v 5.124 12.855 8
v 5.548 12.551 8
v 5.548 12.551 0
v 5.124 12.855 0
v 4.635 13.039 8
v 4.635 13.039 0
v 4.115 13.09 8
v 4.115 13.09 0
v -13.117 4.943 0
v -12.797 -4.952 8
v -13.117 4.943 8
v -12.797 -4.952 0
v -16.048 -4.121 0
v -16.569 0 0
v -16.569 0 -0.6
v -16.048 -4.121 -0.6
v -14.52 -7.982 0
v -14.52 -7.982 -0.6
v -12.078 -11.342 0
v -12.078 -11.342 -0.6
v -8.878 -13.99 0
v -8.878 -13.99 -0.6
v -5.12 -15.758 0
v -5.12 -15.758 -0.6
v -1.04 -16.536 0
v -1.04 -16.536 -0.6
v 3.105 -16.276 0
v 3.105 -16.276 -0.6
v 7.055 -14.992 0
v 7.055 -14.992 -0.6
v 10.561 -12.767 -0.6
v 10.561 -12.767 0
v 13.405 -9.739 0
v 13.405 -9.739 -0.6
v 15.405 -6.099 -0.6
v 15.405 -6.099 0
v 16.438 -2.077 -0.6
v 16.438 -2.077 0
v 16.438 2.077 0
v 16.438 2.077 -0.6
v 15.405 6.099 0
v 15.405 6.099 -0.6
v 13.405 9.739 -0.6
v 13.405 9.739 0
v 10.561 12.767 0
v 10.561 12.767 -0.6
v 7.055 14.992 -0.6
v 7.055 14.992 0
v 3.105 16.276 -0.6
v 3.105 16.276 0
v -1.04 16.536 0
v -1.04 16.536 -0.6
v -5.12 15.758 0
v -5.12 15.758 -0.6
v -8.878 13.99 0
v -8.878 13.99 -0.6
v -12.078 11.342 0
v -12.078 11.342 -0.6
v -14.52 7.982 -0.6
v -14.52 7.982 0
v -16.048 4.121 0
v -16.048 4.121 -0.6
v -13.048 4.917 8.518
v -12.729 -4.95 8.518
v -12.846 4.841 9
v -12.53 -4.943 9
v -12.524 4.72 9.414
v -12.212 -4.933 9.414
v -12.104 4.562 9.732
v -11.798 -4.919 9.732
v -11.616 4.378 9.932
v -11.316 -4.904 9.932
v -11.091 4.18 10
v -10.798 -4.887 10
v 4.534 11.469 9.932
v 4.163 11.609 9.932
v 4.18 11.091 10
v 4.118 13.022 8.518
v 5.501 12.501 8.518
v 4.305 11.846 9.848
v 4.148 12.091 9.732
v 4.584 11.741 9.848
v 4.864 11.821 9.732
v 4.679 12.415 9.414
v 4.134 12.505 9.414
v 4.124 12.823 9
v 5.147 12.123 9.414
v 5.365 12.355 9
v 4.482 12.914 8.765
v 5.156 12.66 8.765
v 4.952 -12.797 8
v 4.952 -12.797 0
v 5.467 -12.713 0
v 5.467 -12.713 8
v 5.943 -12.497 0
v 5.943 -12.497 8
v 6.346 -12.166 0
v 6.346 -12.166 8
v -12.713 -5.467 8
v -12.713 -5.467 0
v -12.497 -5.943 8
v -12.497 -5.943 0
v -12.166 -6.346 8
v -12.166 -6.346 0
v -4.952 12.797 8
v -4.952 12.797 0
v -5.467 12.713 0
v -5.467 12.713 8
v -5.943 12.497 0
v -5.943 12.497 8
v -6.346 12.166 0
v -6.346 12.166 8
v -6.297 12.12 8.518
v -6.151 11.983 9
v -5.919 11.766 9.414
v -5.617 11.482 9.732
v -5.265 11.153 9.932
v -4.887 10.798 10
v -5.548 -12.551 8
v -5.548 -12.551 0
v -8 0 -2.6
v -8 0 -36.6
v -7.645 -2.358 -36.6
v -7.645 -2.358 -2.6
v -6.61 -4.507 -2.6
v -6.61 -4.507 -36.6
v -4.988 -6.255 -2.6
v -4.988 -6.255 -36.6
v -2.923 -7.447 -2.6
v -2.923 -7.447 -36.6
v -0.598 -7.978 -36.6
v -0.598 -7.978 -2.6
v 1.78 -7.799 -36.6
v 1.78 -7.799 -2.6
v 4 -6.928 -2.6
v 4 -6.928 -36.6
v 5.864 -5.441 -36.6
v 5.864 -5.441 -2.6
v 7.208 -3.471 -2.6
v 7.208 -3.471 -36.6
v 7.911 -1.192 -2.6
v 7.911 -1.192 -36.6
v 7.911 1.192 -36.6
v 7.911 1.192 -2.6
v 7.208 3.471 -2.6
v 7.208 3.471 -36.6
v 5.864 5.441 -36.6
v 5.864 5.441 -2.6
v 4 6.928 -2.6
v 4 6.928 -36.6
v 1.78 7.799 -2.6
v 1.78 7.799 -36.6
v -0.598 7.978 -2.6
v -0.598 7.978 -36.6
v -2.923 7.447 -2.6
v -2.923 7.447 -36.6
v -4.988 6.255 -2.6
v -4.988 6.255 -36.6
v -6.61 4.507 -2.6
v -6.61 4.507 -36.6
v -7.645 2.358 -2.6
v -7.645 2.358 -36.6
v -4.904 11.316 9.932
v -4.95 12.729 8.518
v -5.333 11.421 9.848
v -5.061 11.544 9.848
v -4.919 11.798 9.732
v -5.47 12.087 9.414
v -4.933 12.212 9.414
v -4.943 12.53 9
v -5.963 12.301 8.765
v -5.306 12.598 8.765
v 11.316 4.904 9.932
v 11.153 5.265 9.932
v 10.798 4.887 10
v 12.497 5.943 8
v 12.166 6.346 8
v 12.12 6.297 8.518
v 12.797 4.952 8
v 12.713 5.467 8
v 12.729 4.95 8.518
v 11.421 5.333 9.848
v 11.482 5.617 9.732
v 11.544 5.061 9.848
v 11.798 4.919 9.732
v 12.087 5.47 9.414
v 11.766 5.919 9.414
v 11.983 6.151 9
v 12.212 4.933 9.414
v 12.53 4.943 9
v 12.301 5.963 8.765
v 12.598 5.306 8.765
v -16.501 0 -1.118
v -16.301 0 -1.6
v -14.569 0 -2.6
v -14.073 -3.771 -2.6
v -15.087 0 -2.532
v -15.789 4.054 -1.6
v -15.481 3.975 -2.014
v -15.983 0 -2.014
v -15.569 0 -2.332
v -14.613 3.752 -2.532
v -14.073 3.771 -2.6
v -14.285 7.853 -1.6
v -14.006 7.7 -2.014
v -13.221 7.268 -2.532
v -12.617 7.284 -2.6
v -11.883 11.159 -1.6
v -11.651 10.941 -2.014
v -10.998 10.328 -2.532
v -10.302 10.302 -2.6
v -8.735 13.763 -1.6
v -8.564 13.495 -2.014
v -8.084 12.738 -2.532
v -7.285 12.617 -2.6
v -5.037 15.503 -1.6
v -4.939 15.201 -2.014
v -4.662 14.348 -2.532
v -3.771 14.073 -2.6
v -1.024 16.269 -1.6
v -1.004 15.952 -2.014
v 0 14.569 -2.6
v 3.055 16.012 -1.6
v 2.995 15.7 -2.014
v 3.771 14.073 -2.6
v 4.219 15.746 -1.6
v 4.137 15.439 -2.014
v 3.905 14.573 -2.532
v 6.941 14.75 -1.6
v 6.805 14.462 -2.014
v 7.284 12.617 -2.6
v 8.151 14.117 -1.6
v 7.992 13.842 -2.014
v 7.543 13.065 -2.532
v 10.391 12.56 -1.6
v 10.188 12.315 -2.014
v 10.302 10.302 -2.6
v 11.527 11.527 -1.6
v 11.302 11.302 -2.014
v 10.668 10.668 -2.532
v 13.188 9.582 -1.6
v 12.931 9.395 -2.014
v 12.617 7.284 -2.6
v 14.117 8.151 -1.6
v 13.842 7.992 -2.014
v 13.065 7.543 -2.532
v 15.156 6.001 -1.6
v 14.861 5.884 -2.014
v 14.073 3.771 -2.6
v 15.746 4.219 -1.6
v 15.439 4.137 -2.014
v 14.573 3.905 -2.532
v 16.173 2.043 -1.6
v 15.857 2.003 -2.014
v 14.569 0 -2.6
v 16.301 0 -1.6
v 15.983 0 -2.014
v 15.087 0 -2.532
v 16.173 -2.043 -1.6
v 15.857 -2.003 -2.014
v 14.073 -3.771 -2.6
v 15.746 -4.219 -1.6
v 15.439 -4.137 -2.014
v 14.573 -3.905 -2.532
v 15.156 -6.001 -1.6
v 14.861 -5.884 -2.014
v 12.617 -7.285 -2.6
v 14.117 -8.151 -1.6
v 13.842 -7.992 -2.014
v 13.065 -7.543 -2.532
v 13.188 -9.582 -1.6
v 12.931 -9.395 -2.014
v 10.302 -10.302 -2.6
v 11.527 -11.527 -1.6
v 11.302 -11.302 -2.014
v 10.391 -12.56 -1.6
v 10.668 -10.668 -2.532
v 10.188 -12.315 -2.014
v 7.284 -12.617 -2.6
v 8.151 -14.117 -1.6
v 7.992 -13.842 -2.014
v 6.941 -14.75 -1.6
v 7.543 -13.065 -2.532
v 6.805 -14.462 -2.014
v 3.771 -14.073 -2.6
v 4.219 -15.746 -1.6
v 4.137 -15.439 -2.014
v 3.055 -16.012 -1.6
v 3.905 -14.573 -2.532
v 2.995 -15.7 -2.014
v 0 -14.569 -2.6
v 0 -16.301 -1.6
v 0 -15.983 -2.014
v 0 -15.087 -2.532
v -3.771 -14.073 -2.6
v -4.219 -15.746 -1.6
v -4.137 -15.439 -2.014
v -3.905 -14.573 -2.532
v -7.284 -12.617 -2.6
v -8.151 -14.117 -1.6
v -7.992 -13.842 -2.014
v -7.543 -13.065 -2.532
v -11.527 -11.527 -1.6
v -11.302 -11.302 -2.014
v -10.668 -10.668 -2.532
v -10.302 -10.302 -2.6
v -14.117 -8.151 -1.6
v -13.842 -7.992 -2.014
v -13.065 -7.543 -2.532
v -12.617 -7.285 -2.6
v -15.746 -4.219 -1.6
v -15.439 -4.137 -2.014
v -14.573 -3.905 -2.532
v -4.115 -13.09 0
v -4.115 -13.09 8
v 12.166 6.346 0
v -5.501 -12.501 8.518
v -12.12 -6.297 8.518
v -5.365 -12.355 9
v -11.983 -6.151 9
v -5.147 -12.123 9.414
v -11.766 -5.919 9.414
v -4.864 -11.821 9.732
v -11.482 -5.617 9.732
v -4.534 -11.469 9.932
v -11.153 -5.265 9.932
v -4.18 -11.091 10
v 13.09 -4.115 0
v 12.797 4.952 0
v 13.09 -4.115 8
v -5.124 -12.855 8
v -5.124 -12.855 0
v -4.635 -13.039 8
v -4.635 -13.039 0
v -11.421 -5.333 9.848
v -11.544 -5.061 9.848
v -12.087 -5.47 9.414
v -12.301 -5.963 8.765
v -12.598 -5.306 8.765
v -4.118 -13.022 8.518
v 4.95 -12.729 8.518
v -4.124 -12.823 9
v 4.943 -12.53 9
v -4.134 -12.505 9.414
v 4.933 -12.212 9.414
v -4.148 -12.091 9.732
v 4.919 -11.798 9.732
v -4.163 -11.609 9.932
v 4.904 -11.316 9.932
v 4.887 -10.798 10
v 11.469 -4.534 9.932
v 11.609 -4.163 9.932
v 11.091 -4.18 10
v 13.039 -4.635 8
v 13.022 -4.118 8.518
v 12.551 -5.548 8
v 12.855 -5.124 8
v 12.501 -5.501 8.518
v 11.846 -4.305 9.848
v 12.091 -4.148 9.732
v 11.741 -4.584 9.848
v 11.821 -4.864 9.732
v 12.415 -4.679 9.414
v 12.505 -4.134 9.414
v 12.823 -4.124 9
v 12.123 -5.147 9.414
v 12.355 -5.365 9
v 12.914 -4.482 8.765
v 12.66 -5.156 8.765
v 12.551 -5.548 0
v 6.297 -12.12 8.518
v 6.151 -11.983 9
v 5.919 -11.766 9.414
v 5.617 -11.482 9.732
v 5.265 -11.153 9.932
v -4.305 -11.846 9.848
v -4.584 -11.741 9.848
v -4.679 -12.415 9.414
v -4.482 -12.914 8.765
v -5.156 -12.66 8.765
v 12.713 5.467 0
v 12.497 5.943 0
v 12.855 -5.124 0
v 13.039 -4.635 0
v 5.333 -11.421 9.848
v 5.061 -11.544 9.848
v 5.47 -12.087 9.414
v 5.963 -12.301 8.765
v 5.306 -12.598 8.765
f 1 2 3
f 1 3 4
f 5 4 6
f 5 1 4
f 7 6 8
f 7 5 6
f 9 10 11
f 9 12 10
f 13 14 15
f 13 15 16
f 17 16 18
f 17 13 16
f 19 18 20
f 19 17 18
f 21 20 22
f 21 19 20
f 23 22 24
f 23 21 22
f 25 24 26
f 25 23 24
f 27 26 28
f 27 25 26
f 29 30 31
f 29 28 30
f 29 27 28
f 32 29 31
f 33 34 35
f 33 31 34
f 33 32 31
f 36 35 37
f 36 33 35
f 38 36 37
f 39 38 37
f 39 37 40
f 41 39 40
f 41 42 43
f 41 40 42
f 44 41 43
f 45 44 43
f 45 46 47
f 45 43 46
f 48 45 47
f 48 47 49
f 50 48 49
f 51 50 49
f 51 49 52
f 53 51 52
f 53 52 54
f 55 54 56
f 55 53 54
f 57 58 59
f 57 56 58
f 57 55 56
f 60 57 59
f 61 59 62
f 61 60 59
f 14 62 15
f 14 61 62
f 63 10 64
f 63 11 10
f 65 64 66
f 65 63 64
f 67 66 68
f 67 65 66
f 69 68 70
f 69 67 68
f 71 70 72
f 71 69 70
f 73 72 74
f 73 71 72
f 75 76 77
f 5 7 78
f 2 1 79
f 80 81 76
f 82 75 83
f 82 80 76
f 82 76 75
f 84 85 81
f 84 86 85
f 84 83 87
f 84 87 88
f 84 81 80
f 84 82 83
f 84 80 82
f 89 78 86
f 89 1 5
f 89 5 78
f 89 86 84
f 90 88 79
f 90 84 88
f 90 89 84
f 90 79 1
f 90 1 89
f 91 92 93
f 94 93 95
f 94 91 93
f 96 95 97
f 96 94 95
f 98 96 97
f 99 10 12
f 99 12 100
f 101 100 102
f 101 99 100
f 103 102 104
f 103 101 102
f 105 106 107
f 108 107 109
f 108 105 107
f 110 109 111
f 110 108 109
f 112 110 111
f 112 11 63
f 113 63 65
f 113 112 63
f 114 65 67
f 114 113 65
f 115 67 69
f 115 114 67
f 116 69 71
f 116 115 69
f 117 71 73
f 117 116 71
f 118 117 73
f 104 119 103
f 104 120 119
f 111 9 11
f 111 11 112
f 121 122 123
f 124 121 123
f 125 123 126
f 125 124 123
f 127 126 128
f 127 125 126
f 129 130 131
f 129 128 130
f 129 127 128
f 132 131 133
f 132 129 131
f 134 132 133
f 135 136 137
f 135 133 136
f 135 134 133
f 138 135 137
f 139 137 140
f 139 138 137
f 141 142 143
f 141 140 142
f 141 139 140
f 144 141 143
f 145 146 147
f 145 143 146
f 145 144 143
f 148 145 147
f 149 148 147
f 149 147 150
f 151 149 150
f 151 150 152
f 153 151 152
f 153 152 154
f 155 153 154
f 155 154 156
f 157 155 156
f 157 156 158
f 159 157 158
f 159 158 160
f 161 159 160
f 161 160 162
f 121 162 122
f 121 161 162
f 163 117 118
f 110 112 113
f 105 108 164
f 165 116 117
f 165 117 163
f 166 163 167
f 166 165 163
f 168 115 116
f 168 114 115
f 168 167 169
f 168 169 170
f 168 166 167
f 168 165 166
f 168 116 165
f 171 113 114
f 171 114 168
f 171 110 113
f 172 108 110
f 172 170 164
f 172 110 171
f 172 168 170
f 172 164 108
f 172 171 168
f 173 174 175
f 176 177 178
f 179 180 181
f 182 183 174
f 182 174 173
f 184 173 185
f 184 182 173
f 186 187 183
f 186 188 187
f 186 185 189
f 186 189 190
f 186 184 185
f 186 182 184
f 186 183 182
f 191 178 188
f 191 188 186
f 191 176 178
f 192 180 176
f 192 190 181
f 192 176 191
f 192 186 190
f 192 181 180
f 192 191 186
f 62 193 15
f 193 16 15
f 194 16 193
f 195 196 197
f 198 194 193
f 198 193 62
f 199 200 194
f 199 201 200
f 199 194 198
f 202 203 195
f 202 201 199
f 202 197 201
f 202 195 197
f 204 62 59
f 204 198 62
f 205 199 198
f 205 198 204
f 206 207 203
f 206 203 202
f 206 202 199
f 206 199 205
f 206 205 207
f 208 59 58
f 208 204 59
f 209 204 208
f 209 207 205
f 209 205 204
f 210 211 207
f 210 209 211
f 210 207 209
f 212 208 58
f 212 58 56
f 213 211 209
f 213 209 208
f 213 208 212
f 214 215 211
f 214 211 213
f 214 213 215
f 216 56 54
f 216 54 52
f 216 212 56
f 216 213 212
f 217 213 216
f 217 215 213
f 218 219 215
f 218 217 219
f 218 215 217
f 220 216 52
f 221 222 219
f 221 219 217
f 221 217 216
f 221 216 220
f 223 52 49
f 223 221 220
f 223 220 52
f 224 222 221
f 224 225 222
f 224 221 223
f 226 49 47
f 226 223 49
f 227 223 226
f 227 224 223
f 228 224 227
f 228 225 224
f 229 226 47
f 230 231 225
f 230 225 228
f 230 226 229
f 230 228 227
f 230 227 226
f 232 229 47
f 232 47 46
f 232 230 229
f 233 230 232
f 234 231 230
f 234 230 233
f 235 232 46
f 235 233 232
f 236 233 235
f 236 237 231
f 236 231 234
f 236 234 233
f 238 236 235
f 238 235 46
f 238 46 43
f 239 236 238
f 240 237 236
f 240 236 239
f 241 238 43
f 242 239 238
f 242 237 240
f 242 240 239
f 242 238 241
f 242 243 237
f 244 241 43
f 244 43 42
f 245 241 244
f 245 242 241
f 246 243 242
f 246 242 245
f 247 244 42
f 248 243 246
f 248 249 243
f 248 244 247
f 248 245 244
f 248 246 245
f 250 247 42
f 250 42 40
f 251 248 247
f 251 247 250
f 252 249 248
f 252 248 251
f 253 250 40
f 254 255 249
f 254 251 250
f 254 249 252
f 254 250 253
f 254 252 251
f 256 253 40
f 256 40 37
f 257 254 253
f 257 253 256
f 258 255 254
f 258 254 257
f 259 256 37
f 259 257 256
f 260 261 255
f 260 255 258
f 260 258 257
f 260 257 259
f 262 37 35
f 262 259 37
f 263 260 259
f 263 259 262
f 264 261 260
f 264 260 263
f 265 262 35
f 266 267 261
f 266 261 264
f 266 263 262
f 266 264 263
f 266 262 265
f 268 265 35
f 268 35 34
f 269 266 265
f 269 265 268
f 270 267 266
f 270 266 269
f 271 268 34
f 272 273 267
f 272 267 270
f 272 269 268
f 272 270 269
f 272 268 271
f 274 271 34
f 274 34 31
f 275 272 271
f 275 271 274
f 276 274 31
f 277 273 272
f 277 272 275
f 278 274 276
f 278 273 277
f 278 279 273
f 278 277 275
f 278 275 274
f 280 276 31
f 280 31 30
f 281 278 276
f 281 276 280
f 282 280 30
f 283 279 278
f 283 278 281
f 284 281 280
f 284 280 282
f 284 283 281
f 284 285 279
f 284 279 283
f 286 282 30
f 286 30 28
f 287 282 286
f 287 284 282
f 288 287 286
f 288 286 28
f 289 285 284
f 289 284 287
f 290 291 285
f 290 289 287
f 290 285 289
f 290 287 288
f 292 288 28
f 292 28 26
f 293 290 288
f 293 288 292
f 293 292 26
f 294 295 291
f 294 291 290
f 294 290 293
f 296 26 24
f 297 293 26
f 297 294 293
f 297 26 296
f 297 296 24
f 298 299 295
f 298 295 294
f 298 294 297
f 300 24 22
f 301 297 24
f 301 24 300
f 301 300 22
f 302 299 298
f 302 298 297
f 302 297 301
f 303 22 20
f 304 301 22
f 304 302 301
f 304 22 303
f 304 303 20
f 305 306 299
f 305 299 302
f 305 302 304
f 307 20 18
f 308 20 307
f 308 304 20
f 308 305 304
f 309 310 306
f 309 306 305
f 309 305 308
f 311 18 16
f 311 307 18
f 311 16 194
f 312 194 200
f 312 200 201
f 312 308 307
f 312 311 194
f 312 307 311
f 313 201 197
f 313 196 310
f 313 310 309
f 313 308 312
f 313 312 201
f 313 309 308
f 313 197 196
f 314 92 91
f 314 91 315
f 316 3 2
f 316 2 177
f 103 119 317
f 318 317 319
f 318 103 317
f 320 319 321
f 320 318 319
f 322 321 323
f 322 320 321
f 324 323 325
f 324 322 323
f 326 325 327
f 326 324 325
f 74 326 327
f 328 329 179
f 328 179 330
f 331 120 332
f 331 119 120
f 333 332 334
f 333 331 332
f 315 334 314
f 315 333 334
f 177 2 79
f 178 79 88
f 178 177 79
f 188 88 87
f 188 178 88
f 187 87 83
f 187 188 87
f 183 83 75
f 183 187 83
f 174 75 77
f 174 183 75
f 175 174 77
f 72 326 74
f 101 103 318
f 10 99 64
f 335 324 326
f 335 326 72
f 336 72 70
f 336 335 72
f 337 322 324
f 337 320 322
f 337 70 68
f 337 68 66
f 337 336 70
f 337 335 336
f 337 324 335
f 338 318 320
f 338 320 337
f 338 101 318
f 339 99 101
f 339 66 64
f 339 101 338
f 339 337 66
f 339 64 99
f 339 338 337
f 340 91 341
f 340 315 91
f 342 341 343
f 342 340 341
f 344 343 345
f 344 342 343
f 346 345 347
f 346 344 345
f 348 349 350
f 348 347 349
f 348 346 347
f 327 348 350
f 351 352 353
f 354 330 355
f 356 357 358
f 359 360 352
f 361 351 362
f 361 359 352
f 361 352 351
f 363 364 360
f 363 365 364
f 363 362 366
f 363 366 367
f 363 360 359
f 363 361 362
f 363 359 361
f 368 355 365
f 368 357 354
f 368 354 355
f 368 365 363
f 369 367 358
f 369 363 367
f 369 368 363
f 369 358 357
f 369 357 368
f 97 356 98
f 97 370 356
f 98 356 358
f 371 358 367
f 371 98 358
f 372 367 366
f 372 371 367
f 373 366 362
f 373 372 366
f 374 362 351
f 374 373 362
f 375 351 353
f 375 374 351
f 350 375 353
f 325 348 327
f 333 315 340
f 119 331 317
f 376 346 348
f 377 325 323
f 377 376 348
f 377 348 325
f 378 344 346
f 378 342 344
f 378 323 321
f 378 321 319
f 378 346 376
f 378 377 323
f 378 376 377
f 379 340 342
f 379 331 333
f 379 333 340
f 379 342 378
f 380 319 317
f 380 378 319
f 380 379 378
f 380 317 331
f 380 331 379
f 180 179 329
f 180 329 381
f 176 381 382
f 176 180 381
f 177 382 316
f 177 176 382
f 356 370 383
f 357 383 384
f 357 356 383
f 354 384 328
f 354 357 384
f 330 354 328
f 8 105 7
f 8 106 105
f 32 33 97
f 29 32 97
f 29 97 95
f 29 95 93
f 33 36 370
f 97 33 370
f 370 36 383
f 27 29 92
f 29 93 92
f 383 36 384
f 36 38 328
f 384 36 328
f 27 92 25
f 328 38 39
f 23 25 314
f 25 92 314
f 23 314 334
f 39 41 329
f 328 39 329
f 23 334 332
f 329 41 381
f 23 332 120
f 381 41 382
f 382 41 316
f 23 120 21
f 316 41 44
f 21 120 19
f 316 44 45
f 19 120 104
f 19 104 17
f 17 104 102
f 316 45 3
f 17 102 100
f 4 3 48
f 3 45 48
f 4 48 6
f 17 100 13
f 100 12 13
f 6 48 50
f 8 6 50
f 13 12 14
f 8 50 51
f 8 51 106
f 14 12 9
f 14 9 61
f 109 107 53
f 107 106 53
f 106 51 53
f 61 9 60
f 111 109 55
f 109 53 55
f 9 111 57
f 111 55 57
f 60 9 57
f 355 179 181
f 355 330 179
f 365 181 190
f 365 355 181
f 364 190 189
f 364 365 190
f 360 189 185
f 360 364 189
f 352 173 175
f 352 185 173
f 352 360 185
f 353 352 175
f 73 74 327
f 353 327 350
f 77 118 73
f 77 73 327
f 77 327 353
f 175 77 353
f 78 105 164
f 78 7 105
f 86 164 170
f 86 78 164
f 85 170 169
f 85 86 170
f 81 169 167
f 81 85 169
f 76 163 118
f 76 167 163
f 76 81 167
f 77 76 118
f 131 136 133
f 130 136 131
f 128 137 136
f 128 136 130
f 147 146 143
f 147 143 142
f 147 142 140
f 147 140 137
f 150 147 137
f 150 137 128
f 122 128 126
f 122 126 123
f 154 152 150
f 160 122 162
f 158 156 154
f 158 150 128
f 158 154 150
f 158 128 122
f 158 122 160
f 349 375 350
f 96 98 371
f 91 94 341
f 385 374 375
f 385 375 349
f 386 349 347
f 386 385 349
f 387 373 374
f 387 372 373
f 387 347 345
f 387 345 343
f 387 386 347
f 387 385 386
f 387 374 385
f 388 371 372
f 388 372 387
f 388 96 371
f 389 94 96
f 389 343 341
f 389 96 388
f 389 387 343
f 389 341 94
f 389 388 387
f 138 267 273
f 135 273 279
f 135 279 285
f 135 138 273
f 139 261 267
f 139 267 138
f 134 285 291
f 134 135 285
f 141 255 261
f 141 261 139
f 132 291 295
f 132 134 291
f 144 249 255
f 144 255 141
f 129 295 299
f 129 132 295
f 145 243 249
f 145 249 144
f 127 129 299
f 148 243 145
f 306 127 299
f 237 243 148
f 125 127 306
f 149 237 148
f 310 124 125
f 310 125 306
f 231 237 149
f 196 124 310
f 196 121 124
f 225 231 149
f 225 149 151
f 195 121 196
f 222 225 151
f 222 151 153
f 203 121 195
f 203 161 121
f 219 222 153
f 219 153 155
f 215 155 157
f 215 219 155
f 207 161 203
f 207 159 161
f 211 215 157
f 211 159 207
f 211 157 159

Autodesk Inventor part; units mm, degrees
ref_plane "YZ Plane" through (0, 0, 0) normal (1, 0, 0) x (0, 1, 0)
ref_plane "XZ Plane" through (0, 0, 0) normal (0, 1, 0) x (-1, 0, 0)
ref_plane "XY Plane" through (0, 0, 0) normal (0, 0, 1) x (1, 0, 0)
sketch "Sketch1" plane through (0, 0, 0) normal (0, 0, 1) x (1, 0, 0)
  line L0 (13.1171, -4.9434) -> (5.7797, -12.7707)
  line L1 (5.7797, -12.7707) -> (-4.9434, -13.1171)
  line L2 (-4.9434, -13.1171) -> (-12.7707, -5.7797)
  line L3 (-12.7707, -5.7797) -> (-13.1171, 4.9434)
  line L4 (-13.1171, 4.9434) -> (-5.7797, 12.7707)
  line L5 (-5.7797, 12.7707) -> (4.9434, 13.1171)
  line L6 (4.9434, 13.1171) -> (12.7707, 5.7797)
  line L7 (12.7707, 5.7797) -> (13.1171, -4.9434)
  point P0 (0, 0)
  point P1 (0, 0)
extrude "Extrusion1" add sketch "Sketch1" along normal blind 10
fillet "Fillet1" radius 2 15 edges at (-0.4182, 12.9439, 10) (4.9434, 13.1171, 5) (-5.7797, 12.7707, 5) (12.7707, 5.7797, 5) (8.857, 9.4484, 10) (13.1171, -4.9434, 5) (12.9439, 0.4182, 10) (5.7797, -12.7707, 5) (9.4484, -8.857, 10) (-4.9434, -13.1171, 5) (0.4182, -12.9439, 10) (-12.7707, -5.7797, 5) (-8.857, -9.4484, 10) (-12.9439, -0.4182, 10) (-9.4484, 8.857, 10)
sketch "Sketch2" plane through (0, 0, 0) normal (0, 0, -1) x (-1, 0, 0)
  circle A0 centre (0, 0) radius 16.569
extrude "Extrusion2" add sketch "Sketch2" along normal blind 2.6
fillet "Fillet2" radius 2 1 edges at (16.569, 0, -2.6)
sketch "Sketch3" plane through (0, 0, -2.6) normal (0, 0, -1) x (-1, 0, 0)
  circle A0 centre (0, 0) radius 8
  dimension "d7" = 16
extrude "Extrusion3" add sketch "Sketch3" along normal blind 34
thread "Thread1" size "M16x2" class "6g" standard "ISO Metric profile" full length
properties part number "AnnishNT"
